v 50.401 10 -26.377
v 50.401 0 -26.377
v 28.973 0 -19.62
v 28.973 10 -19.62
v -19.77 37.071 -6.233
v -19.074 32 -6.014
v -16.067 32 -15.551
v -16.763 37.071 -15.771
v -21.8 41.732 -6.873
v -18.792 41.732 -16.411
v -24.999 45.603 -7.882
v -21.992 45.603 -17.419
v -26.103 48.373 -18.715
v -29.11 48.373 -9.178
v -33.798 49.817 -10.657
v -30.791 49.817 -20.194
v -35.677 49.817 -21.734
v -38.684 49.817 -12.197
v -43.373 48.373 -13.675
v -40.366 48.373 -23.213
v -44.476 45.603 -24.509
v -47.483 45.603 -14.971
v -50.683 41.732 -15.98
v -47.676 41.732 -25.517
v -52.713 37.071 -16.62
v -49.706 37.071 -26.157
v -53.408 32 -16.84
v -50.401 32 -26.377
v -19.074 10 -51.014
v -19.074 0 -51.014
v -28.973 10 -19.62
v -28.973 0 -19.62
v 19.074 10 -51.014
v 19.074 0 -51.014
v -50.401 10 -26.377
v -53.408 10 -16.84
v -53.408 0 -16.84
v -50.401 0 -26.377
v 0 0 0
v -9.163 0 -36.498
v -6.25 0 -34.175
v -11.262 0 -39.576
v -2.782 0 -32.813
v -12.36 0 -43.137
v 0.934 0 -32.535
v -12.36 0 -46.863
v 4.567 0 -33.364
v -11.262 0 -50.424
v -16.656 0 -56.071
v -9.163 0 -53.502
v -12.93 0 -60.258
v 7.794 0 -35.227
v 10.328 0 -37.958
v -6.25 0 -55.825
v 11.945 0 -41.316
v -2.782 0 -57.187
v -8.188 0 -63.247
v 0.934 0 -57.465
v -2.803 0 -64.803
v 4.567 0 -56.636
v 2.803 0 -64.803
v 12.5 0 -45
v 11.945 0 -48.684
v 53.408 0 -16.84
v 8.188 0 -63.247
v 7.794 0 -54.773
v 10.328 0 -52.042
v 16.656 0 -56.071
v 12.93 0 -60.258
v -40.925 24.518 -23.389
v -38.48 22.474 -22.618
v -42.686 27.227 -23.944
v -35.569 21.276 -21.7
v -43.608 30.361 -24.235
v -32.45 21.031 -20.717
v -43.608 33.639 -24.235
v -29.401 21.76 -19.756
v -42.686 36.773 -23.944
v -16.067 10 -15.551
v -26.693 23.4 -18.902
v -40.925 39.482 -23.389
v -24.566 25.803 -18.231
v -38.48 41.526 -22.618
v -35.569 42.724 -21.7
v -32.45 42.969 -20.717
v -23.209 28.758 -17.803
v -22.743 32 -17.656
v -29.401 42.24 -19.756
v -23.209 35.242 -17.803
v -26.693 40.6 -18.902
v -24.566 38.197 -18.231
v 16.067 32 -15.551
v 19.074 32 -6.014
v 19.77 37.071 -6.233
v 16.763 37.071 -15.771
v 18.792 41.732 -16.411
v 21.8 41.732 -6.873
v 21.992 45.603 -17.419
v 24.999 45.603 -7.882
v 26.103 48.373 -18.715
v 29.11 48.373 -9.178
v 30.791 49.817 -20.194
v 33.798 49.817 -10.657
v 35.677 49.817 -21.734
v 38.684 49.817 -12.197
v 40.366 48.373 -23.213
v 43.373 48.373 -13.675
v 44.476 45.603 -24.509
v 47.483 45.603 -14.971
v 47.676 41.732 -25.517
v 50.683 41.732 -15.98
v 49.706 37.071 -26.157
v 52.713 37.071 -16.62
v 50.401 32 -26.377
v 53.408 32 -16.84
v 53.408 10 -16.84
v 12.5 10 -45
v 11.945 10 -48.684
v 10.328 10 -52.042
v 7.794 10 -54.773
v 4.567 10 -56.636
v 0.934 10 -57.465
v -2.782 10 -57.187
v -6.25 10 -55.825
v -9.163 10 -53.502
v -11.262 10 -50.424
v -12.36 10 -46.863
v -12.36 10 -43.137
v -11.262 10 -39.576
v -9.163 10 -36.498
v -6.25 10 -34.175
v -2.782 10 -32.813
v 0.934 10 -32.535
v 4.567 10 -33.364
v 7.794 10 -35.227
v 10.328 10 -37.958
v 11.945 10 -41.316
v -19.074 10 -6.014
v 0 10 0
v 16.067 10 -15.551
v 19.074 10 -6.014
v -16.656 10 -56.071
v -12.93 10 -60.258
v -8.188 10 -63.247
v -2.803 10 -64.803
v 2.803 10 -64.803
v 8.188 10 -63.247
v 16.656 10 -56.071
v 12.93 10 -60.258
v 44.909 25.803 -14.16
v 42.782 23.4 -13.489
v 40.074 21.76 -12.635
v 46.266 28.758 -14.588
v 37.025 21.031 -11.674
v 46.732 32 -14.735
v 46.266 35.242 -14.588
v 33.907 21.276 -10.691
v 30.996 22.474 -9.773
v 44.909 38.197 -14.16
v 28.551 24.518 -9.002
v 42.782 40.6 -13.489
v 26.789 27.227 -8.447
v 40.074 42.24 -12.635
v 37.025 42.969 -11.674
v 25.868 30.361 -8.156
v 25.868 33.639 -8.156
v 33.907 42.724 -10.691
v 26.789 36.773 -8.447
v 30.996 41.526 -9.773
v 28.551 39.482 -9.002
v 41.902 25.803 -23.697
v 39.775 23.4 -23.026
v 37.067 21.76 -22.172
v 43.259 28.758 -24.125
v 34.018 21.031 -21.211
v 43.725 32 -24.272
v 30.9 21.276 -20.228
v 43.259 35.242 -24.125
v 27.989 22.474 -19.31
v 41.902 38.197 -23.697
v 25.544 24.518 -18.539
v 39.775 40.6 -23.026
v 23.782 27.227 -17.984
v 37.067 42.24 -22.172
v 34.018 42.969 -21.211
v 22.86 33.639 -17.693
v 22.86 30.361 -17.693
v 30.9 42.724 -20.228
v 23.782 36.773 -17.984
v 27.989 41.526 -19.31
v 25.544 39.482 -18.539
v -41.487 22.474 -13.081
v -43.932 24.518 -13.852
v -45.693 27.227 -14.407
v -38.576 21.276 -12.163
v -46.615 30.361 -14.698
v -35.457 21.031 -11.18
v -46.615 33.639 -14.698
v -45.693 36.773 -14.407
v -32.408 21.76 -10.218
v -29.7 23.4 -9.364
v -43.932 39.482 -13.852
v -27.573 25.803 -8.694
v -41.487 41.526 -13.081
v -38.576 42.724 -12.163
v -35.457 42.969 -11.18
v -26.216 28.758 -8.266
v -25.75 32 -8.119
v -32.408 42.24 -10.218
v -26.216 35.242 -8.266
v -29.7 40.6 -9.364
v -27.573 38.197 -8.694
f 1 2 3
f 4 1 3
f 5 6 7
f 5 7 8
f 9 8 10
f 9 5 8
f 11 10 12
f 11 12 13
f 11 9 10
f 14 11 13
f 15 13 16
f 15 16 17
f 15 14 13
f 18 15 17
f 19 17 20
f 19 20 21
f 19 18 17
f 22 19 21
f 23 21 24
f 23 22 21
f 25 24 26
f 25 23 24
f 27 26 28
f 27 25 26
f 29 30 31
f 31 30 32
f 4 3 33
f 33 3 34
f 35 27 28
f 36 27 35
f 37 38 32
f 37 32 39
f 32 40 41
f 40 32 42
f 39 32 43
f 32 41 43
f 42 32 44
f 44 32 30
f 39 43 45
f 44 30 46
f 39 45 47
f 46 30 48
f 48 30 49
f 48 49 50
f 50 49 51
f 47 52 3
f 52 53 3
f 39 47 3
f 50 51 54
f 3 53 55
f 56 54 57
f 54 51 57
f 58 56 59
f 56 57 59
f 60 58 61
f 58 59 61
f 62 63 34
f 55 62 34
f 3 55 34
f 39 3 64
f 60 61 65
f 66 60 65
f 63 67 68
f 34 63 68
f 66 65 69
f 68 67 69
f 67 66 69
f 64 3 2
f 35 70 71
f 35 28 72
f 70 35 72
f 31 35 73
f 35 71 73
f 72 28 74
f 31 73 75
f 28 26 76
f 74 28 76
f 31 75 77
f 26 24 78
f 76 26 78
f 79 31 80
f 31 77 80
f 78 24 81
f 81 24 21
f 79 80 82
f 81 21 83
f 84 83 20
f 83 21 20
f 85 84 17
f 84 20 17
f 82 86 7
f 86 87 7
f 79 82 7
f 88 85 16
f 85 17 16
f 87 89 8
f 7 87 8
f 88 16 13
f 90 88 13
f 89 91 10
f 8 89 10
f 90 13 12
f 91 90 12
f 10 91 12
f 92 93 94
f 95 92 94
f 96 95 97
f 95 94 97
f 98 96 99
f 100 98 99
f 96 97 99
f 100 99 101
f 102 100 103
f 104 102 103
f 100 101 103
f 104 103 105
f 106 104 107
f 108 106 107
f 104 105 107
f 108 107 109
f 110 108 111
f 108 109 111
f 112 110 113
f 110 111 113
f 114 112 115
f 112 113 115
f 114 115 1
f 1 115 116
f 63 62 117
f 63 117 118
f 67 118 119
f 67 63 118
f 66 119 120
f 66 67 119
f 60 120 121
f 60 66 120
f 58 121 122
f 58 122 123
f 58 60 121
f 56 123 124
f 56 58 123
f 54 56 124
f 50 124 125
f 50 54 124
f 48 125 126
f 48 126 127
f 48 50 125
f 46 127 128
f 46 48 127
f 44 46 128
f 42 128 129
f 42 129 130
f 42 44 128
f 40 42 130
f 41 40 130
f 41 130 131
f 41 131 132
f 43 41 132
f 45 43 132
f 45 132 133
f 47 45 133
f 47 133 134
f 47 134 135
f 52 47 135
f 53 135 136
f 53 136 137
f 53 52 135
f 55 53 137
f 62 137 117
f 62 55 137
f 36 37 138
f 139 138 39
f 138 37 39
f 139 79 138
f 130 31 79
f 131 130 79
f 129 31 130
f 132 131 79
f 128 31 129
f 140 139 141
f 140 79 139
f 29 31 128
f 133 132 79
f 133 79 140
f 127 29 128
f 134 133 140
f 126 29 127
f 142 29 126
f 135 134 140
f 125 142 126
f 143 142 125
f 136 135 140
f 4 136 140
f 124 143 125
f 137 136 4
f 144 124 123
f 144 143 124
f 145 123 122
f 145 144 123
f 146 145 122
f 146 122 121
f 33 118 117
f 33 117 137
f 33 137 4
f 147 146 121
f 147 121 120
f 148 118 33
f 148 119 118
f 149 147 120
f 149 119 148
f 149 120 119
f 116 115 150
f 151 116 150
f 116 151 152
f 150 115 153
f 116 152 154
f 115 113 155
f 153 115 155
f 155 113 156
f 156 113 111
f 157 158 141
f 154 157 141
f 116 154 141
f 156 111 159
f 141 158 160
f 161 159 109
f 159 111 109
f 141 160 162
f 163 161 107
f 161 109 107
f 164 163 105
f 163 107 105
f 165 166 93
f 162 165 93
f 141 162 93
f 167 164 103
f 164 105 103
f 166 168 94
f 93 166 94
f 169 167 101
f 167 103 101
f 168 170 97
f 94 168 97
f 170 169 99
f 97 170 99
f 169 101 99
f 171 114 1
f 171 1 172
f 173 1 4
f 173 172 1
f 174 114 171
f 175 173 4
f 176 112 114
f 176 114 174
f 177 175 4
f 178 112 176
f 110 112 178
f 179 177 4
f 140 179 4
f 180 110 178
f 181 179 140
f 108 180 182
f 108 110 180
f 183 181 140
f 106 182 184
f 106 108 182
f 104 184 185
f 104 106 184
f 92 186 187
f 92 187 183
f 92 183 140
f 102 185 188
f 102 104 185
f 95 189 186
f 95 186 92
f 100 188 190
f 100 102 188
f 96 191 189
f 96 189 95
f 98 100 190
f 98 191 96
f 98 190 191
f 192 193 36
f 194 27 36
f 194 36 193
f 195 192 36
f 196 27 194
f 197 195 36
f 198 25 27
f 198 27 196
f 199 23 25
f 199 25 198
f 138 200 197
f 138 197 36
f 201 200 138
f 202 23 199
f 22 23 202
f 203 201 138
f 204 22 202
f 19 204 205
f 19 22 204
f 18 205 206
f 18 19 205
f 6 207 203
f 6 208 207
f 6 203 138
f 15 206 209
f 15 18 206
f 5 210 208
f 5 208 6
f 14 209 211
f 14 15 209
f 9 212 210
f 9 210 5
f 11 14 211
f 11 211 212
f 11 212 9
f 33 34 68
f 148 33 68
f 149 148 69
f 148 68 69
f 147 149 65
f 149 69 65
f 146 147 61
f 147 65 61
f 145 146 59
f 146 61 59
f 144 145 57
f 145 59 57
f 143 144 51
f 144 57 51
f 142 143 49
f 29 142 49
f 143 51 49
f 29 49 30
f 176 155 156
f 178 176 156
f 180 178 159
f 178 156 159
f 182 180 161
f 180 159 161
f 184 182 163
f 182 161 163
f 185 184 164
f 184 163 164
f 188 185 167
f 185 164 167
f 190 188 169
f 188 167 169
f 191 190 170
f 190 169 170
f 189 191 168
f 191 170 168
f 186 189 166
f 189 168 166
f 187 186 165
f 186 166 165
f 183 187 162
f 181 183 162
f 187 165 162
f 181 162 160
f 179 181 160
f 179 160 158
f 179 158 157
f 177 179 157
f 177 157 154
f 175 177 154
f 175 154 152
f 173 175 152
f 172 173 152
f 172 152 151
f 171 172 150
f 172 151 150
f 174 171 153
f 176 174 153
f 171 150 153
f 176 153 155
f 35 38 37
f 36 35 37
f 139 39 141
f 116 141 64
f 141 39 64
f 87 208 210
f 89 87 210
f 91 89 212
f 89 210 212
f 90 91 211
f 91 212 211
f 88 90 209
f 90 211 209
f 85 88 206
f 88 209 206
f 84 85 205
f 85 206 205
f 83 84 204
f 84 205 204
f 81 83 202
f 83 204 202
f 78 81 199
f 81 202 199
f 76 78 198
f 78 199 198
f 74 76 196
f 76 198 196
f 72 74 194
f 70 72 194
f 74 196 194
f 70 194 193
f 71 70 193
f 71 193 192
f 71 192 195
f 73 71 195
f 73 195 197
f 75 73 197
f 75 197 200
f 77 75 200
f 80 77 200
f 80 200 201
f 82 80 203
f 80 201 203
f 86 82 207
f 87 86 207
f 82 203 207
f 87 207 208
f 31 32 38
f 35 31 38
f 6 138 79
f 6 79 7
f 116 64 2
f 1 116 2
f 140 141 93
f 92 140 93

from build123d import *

# Parameters (mm, degrees)
SKETCH1_R           = 12.5
BOSS_EXTRUDE1_DEPTH = 10
SKETCH2_R           = 11
BOSS_EXTRUDE2_DEPTH = 10
SKETCH4_R           = 11
BOSS_EXTRUDE3_DEPTH = 10


with BuildPart() as part:
    # Sketch1 → Boss-Extrude1 (new body)
    with BuildSketch(Plane(origin=(0, 0, 0), x_dir=(1, 0, 0), z_dir=(0, 1, 0))):
        with BuildLine():
            Line((0, 0), (53.408149242, 16.839524772))
            Line((53.408149242, 16.839524772), (50.401091247, 26.37669428))
            Line((50.401091247, 26.37669428), (28.972750838, 19.620364501))
            Line((28.972750838, 19.620364501), (19.074339015, 51.01411599))
            ThreePointArc((19.074339015, 51.01411599), (0, 65), (-19.074339015, 51.01411599))
            Line((-19.074339015, 51.01411599), (-28.972750838, 19.620364501))
            Line((-28.972750838, 19.620364501), (-50.401091247, 26.37669428))
            Line((-50.401091247, 26.37669428), (-53.408149242, 16.839524772))
            Line((-53.408149242, 16.839524772), (0, 0))
        make_face()
        with Locations((0, 45)):
            Circle(SKETCH1_R, mode=Mode.SUBTRACT)
    extrude(amount=BOSS_EXTRUDE1_DEPTH)

    # Sketch2 → Boss-Extrude2 (add)
    with BuildSketch(Plane(origin=(0, 0, 0), x_dir=(0.953716951, 0, -0.3007058), z_dir=(0.3007058, 0, 0.953716951))):
        with BuildLine():
            Line((56, 32), (56, 10))
            Line((56, 10), (20, 10))
            Line((20, 10), (20, 32))
            ThreePointArc((20, 32), (38, 50), (56, 32))
        make_face()
        with Locations((38, 32)):
            Circle(SKETCH2_R, mode=Mode.SUBTRACT)
    extrude(amount=-BOSS_EXTRUDE2_DEPTH)

    # Sketch4 → Boss-Extrude3 (add)
    with BuildSketch(Plane(origin=(0, 0, 0), x_dir=(0.953716951, 0, 0.3007058), z_dir=(-0.3007058, 0, 0.953716951))):
        with BuildLine():
            Line((-20, 10), (-20, 32))
            ThreePointArc((-20, 32), (-38, 50), (-56, 32))
            Line((-56, 32), (-56, 10))
            Line((-56, 10), (-20, 10))
        make_face()
        with Locations((-38, 32)):
            Circle(SKETCH4_R, mode=Mode.SUBTRACT)
    extrude(amount=-BOSS_EXTRUDE3_DEPTH)


solid = part.part
